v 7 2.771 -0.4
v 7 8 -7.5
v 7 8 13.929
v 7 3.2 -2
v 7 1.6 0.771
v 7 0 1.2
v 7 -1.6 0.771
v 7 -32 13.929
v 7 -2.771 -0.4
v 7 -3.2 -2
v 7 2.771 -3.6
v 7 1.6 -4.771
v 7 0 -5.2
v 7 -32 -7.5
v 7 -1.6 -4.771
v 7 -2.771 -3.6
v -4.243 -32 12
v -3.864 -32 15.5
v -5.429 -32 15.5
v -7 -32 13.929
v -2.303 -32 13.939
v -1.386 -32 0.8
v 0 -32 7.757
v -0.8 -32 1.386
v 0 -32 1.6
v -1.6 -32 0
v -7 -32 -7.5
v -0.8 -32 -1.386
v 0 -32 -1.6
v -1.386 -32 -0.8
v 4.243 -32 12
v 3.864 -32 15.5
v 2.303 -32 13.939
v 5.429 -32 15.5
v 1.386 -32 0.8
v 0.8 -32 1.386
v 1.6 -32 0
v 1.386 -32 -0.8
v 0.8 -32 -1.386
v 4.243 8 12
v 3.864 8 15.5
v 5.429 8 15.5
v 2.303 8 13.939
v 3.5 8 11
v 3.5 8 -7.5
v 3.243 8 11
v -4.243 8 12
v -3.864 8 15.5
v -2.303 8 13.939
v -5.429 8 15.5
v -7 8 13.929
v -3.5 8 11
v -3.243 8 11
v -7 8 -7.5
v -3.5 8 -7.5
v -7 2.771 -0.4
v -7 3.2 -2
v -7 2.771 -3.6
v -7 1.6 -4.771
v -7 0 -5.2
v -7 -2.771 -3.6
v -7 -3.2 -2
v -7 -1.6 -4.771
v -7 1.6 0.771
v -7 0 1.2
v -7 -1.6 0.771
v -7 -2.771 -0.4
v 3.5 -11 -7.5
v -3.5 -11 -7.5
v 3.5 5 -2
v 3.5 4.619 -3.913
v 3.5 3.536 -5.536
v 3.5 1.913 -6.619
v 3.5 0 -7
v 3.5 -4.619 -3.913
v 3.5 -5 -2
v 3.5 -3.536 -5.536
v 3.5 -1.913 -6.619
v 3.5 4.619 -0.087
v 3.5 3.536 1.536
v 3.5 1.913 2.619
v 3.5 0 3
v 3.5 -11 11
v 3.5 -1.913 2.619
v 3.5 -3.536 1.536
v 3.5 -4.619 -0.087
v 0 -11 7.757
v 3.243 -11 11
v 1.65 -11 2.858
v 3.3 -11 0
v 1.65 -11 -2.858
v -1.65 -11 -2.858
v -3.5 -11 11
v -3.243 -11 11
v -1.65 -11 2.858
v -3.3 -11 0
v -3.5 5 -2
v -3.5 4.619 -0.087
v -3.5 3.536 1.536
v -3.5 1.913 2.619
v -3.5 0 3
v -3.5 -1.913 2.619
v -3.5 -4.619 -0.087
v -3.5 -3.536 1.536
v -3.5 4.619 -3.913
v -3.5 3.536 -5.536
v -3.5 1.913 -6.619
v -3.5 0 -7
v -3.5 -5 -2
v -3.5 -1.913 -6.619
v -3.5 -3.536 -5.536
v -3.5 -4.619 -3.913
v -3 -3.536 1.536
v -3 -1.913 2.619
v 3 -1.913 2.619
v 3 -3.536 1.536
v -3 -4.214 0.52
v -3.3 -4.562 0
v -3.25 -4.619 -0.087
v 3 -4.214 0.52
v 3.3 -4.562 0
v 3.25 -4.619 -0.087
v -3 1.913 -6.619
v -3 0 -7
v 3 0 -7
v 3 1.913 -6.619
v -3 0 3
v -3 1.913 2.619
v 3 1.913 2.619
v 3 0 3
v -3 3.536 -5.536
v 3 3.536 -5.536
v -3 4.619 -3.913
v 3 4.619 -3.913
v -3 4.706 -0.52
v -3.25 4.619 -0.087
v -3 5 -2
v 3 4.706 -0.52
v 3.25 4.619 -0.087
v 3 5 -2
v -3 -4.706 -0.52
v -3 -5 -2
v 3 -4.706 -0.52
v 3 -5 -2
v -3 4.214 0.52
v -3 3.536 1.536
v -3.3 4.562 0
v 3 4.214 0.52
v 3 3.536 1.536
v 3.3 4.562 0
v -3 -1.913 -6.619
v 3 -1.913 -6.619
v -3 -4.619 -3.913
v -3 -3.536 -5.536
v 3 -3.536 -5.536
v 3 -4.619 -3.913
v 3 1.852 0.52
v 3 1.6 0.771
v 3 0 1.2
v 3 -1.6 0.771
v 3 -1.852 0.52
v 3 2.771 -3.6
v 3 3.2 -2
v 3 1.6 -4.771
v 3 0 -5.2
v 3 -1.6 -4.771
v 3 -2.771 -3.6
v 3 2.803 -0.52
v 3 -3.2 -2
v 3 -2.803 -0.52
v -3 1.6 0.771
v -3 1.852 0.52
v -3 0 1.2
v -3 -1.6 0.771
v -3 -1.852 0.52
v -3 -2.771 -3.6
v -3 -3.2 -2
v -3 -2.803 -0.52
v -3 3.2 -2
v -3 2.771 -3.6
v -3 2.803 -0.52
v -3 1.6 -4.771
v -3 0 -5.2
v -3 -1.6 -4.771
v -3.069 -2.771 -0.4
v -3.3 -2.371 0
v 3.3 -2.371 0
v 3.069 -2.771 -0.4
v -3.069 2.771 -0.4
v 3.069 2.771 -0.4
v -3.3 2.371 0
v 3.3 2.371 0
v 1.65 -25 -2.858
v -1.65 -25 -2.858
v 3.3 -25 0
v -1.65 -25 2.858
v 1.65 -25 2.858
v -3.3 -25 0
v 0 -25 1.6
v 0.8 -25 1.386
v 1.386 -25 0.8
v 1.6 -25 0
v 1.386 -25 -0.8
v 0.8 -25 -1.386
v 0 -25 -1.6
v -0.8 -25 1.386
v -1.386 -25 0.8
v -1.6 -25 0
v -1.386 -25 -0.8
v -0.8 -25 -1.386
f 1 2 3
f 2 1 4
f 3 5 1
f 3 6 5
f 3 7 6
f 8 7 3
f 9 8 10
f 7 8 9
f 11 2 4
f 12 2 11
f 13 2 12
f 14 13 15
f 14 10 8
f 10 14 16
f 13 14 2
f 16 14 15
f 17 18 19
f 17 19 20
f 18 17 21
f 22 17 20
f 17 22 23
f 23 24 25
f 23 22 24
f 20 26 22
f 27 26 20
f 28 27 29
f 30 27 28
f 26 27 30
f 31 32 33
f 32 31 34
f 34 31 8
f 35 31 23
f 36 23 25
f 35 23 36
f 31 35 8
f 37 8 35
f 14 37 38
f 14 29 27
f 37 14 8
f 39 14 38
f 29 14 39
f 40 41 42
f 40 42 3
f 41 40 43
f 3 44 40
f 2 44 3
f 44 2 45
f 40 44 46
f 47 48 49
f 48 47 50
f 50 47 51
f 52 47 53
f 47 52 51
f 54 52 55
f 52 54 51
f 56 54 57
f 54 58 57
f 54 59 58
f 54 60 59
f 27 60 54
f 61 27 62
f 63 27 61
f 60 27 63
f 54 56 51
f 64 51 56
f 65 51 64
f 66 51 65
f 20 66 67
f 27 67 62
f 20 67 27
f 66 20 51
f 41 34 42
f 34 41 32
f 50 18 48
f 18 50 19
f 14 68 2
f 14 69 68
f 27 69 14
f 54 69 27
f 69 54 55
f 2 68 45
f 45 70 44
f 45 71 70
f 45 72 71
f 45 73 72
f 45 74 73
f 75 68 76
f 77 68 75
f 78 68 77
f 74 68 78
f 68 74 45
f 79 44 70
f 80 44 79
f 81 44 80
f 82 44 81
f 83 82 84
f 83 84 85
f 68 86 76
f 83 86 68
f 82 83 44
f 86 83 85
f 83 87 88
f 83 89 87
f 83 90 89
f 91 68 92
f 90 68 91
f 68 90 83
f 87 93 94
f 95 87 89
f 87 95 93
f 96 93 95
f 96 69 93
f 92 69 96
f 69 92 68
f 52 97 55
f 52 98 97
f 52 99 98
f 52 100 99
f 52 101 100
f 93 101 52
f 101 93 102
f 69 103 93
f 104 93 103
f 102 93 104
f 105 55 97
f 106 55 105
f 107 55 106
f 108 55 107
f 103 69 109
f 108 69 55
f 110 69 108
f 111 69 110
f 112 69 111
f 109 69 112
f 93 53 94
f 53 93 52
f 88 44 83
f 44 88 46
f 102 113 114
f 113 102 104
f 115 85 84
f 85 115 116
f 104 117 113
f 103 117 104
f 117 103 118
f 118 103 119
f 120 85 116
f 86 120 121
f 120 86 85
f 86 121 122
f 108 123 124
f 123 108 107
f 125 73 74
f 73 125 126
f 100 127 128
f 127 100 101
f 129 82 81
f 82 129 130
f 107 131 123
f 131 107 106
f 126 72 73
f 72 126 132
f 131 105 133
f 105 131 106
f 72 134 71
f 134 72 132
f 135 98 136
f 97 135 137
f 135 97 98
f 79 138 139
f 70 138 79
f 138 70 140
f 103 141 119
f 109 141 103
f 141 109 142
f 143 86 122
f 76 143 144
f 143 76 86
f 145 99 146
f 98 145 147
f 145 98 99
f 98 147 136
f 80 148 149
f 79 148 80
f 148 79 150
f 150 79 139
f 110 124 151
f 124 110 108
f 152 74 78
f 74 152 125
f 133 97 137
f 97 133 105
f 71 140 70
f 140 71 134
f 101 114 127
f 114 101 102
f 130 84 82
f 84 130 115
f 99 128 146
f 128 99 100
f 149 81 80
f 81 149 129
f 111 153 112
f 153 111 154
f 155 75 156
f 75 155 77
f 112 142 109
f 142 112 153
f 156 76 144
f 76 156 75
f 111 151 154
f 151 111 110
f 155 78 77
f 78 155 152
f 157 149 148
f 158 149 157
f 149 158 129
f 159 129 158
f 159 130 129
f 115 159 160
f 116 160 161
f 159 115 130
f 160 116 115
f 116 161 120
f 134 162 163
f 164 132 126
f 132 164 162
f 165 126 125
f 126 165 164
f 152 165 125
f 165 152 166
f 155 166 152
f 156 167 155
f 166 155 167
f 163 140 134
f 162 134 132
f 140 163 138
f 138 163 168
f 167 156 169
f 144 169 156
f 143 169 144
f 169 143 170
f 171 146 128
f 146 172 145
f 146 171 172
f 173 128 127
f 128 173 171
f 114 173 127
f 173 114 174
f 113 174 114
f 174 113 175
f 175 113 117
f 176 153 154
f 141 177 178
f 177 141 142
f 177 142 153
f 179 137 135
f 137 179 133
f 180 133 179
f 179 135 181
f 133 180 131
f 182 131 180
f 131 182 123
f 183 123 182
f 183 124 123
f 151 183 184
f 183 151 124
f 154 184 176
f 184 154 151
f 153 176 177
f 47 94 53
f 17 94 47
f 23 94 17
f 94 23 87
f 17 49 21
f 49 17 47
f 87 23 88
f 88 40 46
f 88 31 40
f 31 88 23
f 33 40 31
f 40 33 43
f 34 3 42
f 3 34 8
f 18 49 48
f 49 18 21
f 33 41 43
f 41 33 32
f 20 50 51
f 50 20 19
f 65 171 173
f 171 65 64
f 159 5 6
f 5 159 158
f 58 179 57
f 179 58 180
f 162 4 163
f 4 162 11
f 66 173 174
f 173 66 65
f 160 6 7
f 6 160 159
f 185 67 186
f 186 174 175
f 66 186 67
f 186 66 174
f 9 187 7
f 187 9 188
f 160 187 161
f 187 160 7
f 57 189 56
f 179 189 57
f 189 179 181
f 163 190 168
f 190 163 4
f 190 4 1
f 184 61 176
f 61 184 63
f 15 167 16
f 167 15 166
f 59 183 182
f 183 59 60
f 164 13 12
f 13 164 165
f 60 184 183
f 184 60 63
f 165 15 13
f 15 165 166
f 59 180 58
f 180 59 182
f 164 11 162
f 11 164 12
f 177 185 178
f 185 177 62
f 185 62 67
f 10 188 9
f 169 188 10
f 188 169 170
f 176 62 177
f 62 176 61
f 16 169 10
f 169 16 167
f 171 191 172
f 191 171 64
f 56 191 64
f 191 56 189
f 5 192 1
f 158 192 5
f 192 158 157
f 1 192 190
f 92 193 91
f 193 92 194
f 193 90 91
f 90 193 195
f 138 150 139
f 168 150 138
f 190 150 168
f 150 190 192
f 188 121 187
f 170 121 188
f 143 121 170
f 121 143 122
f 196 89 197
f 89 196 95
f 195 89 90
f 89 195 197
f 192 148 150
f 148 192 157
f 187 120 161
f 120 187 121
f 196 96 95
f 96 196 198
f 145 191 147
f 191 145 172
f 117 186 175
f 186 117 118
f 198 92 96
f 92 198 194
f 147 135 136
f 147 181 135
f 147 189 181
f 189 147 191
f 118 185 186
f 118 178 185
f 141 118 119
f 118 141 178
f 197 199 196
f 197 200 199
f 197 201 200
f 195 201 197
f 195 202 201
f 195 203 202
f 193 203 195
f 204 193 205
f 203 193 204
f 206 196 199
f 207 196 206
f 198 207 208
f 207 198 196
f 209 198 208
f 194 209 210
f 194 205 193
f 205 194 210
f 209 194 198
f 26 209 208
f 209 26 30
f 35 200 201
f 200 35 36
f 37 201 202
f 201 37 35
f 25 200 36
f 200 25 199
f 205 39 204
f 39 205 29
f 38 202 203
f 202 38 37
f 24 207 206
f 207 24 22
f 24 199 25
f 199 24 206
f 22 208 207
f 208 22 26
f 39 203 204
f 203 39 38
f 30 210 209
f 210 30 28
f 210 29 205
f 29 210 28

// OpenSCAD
module tensioner() {
  difference() {
    union() {
      difference() {
        translate([0, 4, 12]) cube([14, 23, 40], center=true);
        cube([7, 22, 22], center=true);
      }
      translate([0, -2, 0]) rotate([0, 90, 0])
        cylinder(r=5, h=10, center=true);
    }
    cube([6, 20, 20], center=true);
    translate([0, 12, 0]) rotate([0, 0, 45]) cube([6, 6, 150], center=true);
    translate([10, 18, 0]) rotate([0, 0, 45]) cube([10, 10, 150], center=true);
    translate([0, 18, 0]) rotate([0, 0, 45]) cube([9, 9, 150], center=true);
    translate([-10, 18, 0]) rotate([0, 0, 45]) cube([10, 10, 150], center=true);
    translate([0, -2, 0]) rotate([0, 90, 0])
      cylinder(r=3.2, h=20, center=true, $fn=12);
    cylinder(r=3.3, h=50, center=true, $fn=6);
    cylinder(r=1.6, h=80, center=true, $fn=12);
  }
}

rotate([90, 0, 0])
tensioner();
